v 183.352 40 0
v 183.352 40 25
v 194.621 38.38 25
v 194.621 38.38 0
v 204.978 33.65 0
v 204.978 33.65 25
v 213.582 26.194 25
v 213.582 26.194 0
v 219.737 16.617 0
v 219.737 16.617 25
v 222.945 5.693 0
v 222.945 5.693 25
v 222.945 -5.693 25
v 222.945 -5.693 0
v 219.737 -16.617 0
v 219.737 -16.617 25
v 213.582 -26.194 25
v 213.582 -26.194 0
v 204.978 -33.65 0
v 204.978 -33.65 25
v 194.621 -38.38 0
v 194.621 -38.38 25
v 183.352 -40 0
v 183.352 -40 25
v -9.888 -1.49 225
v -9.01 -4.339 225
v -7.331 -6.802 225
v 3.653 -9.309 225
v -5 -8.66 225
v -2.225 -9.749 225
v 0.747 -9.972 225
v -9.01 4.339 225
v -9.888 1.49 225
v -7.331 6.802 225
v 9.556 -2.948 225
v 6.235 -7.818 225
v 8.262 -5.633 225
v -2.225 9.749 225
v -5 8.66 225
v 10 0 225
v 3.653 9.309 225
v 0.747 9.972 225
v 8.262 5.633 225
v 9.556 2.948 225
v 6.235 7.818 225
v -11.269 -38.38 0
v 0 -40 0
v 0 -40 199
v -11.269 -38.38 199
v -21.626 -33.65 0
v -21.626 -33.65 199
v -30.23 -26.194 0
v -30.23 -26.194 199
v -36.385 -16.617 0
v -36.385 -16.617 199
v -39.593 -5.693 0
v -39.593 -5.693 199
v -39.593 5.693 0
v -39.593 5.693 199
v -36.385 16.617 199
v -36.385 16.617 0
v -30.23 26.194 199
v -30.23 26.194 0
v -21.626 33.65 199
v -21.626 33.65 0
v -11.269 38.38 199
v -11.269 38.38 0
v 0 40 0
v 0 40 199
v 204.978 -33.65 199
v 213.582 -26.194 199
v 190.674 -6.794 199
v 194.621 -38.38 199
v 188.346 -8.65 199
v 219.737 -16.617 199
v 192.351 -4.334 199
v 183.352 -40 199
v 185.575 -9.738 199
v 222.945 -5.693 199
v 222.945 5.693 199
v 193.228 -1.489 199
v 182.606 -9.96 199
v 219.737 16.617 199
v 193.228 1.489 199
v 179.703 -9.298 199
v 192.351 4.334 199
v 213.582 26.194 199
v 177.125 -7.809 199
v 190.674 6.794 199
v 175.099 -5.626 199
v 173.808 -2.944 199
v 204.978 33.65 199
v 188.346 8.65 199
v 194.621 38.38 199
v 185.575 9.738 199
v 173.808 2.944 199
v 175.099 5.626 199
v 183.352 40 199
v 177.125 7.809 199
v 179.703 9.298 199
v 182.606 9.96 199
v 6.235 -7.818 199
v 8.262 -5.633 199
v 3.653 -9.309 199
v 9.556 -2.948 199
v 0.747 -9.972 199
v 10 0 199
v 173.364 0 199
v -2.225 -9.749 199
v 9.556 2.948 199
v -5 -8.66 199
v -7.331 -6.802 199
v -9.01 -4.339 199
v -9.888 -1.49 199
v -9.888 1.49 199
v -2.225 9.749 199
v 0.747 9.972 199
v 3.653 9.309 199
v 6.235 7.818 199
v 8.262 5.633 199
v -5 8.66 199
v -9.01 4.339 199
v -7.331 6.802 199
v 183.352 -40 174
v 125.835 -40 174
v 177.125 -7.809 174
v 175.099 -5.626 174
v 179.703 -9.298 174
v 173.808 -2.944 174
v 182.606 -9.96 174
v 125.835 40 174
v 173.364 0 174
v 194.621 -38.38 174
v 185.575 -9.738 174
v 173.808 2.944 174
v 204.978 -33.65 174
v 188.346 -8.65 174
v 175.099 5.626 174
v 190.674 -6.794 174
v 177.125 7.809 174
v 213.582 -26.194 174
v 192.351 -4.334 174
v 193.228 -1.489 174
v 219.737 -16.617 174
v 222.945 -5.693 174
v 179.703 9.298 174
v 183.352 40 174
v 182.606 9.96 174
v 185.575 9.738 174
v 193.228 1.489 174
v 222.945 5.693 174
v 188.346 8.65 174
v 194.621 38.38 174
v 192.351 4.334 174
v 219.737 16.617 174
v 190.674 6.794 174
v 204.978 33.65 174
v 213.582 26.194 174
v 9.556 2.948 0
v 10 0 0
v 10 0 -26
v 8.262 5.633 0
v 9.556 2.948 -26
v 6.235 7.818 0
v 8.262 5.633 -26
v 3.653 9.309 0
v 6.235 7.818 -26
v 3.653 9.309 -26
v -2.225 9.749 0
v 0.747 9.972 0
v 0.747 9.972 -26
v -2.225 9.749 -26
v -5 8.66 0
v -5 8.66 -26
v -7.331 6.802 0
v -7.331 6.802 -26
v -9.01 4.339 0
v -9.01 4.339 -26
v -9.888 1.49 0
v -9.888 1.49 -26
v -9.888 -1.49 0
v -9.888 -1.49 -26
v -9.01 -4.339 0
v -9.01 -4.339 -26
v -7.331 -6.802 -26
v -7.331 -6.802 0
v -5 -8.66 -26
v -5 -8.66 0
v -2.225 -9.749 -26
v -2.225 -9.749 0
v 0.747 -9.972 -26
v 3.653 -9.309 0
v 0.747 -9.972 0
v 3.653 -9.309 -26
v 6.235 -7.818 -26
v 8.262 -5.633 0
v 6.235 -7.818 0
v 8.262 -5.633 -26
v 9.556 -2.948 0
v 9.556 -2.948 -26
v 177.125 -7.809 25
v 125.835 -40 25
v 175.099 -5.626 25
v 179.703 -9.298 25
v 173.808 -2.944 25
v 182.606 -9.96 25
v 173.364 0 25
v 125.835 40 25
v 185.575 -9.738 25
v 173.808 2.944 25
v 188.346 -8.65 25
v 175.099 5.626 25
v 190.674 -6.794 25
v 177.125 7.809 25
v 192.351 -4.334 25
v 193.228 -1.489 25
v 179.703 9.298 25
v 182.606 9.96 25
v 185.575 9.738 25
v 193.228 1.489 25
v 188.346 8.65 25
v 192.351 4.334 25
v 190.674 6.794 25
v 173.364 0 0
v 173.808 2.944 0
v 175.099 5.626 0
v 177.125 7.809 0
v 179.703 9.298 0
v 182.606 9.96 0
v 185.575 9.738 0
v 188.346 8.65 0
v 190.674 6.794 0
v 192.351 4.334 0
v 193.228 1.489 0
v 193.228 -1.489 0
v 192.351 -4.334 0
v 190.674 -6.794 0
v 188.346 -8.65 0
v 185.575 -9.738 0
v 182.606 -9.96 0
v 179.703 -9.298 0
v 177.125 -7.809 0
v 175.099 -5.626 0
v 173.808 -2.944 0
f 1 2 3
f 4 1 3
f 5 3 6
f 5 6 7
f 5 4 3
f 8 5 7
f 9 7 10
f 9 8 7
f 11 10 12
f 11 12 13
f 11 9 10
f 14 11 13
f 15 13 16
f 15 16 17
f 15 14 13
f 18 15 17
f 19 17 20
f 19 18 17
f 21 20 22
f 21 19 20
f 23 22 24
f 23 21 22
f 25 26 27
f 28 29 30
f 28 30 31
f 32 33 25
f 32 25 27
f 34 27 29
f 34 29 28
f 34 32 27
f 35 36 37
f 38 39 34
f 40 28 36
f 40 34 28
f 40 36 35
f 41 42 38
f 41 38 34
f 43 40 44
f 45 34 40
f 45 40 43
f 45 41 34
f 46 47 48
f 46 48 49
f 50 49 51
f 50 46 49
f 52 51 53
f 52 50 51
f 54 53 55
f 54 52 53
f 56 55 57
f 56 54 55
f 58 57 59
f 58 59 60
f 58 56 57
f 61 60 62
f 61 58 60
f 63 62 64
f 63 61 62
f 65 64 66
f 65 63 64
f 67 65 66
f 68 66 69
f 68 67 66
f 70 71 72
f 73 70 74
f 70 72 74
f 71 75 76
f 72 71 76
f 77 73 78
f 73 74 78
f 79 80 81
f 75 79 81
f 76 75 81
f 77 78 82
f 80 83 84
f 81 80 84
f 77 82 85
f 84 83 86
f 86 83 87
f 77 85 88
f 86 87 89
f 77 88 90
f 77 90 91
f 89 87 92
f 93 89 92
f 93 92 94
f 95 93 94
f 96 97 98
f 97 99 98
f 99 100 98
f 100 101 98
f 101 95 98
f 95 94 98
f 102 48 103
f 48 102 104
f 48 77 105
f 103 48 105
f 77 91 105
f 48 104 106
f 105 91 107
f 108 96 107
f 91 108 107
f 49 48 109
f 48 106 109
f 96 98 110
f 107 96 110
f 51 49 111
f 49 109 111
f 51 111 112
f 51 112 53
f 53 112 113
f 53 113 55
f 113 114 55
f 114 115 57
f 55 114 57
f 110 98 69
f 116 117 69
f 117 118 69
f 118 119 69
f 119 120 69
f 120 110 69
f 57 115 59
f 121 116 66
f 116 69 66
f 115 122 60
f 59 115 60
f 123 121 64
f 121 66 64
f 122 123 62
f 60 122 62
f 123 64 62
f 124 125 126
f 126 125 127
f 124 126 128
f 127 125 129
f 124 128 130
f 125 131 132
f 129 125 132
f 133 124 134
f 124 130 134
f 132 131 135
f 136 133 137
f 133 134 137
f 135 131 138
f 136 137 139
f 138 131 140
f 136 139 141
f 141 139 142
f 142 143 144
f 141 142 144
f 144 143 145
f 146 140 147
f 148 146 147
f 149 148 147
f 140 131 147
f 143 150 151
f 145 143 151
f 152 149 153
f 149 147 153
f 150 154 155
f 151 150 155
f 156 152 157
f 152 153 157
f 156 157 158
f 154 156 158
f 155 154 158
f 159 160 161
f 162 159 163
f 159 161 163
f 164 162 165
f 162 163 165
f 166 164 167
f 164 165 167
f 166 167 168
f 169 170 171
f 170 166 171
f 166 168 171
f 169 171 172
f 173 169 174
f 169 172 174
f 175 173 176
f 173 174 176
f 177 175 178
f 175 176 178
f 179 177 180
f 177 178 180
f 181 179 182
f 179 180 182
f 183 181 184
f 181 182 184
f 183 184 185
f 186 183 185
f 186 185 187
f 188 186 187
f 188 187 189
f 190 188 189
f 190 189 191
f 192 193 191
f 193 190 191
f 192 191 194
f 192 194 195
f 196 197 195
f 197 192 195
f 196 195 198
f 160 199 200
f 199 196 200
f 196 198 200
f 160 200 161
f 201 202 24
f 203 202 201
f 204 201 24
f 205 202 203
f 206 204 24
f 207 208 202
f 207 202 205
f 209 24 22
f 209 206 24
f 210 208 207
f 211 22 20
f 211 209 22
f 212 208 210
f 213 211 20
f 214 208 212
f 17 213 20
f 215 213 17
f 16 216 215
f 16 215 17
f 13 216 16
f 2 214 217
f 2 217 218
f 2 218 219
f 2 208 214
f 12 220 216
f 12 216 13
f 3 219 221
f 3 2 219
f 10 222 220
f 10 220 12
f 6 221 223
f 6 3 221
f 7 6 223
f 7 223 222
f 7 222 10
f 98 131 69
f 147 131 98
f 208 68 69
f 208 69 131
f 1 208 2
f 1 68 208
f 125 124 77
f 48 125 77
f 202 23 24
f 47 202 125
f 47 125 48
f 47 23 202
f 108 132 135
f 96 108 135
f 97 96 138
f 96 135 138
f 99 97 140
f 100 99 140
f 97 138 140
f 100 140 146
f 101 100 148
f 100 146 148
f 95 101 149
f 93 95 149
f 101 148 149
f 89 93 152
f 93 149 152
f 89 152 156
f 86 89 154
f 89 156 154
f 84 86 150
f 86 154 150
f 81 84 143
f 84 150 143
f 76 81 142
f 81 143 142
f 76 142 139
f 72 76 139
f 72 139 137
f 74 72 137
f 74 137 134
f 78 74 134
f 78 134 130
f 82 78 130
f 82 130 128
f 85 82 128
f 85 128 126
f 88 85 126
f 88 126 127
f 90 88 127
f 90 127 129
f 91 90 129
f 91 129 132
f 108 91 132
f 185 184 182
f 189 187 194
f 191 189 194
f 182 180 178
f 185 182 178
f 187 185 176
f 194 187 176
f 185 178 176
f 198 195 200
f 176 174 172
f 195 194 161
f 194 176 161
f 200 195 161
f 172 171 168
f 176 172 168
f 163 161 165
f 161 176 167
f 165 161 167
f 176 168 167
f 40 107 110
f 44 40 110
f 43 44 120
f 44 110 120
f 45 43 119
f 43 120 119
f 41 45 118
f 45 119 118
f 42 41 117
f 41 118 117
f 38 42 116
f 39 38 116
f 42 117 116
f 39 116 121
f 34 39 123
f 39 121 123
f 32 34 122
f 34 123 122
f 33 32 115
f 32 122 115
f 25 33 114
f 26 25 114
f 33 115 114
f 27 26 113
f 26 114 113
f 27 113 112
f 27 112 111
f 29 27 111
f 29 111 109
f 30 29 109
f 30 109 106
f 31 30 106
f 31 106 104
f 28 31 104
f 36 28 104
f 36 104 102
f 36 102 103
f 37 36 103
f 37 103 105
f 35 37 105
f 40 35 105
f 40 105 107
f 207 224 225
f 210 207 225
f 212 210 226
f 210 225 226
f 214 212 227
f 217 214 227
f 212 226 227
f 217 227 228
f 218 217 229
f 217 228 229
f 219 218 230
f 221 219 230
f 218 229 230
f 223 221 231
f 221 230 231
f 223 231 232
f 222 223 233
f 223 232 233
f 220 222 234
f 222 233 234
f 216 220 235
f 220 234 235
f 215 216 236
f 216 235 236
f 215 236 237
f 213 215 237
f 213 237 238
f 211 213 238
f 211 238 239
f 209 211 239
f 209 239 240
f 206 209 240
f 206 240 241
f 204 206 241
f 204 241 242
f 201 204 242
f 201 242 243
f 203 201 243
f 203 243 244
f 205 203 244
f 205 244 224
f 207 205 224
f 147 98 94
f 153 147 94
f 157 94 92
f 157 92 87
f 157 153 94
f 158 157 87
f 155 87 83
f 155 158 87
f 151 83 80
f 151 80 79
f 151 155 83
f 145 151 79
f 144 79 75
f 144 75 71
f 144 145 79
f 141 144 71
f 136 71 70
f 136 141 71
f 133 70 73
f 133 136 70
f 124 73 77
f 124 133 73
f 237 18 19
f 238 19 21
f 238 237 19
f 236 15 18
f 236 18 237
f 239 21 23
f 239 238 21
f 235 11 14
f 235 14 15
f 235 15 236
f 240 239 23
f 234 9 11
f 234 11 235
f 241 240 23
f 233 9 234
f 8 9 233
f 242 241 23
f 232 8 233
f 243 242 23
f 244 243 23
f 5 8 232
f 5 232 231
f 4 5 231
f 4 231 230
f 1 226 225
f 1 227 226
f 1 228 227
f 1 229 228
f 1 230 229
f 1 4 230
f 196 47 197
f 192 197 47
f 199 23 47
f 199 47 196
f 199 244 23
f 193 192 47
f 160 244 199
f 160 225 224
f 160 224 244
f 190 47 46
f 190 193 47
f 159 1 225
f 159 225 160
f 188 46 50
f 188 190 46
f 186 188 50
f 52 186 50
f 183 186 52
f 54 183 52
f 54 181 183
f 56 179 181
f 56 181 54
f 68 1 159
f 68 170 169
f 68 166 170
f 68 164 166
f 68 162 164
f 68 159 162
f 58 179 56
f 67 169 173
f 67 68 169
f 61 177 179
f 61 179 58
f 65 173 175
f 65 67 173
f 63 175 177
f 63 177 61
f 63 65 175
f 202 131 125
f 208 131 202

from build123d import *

# Parameters (mm, degrees)
SALIENTE_EXTRUIR1_DEPTH      = 199
CROQUIS6_R                   = 9.988
CORTAR_EXTRUIR3_DEPTH        = 240
SALIENTE_EXTRUIR3_DEPTH      = 26
SALIENTE_EXTRUIR3_DEPTH_BACK = 225
CROQUIS3_R                   = 10
CROQUIS12_W                  = 123.646893132
CROQUIS12_H                  = 149
CORTAR_EXTRUIR7_DEPTH        = 122


with BuildPart() as part:
    # Croquis2 → Saliente-Extruir1 (new body)
    with BuildSketch(Plane.XY):
        with BuildLine():
            Line((0, 40), (183.351967946, 40))
            ThreePointArc((183.351967946, 40), (223.351967946, 0), (183.351967946, -40))
            Line((183.351967946, -40), (0, -40))
            ThreePointArc((0, -40), (-40, 0), (0, 40))
        make_face()
    extrude(amount=SALIENTE_EXTRUIR1_DEPTH)

    # Croquis6 → Cortar-Extruir3 (cut)
    with BuildSketch(Plane(origin=(0, 0, 0), x_dir=(-1, 0, 0), z_dir=(0, 0, -1))):
        with Locations((-183.351967946, 0)):
            Circle(CROQUIS6_R)
    extrude(amount=-CORTAR_EXTRUIR3_DEPTH, mode=Mode.SUBTRACT)

    # Croquis3 → Saliente-Extruir3 (add, two sides: drawn at the far end of the back side and taken through both)
    with BuildSketch(Plane.XY.offset(199).offset(-SALIENTE_EXTRUIR3_DEPTH_BACK)):
        Circle(CROQUIS3_R)
    extrude(amount=SALIENTE_EXTRUIR3_DEPTH + SALIENTE_EXTRUIR3_DEPTH_BACK)

    # Croquis12 → Cortar-Extruir7 (cut)
    with BuildSketch(Plane(origin=(0, 40, 0), x_dir=(1, 0, 0), z_dir=(0, 1, 0))):
        with Locations((187.658688953, -99.5)):
            Rectangle(CROQUIS12_W, CROQUIS12_H)
    extrude(amount=-CORTAR_EXTRUIR7_DEPTH, mode=Mode.SUBTRACT)


solid = part.part
